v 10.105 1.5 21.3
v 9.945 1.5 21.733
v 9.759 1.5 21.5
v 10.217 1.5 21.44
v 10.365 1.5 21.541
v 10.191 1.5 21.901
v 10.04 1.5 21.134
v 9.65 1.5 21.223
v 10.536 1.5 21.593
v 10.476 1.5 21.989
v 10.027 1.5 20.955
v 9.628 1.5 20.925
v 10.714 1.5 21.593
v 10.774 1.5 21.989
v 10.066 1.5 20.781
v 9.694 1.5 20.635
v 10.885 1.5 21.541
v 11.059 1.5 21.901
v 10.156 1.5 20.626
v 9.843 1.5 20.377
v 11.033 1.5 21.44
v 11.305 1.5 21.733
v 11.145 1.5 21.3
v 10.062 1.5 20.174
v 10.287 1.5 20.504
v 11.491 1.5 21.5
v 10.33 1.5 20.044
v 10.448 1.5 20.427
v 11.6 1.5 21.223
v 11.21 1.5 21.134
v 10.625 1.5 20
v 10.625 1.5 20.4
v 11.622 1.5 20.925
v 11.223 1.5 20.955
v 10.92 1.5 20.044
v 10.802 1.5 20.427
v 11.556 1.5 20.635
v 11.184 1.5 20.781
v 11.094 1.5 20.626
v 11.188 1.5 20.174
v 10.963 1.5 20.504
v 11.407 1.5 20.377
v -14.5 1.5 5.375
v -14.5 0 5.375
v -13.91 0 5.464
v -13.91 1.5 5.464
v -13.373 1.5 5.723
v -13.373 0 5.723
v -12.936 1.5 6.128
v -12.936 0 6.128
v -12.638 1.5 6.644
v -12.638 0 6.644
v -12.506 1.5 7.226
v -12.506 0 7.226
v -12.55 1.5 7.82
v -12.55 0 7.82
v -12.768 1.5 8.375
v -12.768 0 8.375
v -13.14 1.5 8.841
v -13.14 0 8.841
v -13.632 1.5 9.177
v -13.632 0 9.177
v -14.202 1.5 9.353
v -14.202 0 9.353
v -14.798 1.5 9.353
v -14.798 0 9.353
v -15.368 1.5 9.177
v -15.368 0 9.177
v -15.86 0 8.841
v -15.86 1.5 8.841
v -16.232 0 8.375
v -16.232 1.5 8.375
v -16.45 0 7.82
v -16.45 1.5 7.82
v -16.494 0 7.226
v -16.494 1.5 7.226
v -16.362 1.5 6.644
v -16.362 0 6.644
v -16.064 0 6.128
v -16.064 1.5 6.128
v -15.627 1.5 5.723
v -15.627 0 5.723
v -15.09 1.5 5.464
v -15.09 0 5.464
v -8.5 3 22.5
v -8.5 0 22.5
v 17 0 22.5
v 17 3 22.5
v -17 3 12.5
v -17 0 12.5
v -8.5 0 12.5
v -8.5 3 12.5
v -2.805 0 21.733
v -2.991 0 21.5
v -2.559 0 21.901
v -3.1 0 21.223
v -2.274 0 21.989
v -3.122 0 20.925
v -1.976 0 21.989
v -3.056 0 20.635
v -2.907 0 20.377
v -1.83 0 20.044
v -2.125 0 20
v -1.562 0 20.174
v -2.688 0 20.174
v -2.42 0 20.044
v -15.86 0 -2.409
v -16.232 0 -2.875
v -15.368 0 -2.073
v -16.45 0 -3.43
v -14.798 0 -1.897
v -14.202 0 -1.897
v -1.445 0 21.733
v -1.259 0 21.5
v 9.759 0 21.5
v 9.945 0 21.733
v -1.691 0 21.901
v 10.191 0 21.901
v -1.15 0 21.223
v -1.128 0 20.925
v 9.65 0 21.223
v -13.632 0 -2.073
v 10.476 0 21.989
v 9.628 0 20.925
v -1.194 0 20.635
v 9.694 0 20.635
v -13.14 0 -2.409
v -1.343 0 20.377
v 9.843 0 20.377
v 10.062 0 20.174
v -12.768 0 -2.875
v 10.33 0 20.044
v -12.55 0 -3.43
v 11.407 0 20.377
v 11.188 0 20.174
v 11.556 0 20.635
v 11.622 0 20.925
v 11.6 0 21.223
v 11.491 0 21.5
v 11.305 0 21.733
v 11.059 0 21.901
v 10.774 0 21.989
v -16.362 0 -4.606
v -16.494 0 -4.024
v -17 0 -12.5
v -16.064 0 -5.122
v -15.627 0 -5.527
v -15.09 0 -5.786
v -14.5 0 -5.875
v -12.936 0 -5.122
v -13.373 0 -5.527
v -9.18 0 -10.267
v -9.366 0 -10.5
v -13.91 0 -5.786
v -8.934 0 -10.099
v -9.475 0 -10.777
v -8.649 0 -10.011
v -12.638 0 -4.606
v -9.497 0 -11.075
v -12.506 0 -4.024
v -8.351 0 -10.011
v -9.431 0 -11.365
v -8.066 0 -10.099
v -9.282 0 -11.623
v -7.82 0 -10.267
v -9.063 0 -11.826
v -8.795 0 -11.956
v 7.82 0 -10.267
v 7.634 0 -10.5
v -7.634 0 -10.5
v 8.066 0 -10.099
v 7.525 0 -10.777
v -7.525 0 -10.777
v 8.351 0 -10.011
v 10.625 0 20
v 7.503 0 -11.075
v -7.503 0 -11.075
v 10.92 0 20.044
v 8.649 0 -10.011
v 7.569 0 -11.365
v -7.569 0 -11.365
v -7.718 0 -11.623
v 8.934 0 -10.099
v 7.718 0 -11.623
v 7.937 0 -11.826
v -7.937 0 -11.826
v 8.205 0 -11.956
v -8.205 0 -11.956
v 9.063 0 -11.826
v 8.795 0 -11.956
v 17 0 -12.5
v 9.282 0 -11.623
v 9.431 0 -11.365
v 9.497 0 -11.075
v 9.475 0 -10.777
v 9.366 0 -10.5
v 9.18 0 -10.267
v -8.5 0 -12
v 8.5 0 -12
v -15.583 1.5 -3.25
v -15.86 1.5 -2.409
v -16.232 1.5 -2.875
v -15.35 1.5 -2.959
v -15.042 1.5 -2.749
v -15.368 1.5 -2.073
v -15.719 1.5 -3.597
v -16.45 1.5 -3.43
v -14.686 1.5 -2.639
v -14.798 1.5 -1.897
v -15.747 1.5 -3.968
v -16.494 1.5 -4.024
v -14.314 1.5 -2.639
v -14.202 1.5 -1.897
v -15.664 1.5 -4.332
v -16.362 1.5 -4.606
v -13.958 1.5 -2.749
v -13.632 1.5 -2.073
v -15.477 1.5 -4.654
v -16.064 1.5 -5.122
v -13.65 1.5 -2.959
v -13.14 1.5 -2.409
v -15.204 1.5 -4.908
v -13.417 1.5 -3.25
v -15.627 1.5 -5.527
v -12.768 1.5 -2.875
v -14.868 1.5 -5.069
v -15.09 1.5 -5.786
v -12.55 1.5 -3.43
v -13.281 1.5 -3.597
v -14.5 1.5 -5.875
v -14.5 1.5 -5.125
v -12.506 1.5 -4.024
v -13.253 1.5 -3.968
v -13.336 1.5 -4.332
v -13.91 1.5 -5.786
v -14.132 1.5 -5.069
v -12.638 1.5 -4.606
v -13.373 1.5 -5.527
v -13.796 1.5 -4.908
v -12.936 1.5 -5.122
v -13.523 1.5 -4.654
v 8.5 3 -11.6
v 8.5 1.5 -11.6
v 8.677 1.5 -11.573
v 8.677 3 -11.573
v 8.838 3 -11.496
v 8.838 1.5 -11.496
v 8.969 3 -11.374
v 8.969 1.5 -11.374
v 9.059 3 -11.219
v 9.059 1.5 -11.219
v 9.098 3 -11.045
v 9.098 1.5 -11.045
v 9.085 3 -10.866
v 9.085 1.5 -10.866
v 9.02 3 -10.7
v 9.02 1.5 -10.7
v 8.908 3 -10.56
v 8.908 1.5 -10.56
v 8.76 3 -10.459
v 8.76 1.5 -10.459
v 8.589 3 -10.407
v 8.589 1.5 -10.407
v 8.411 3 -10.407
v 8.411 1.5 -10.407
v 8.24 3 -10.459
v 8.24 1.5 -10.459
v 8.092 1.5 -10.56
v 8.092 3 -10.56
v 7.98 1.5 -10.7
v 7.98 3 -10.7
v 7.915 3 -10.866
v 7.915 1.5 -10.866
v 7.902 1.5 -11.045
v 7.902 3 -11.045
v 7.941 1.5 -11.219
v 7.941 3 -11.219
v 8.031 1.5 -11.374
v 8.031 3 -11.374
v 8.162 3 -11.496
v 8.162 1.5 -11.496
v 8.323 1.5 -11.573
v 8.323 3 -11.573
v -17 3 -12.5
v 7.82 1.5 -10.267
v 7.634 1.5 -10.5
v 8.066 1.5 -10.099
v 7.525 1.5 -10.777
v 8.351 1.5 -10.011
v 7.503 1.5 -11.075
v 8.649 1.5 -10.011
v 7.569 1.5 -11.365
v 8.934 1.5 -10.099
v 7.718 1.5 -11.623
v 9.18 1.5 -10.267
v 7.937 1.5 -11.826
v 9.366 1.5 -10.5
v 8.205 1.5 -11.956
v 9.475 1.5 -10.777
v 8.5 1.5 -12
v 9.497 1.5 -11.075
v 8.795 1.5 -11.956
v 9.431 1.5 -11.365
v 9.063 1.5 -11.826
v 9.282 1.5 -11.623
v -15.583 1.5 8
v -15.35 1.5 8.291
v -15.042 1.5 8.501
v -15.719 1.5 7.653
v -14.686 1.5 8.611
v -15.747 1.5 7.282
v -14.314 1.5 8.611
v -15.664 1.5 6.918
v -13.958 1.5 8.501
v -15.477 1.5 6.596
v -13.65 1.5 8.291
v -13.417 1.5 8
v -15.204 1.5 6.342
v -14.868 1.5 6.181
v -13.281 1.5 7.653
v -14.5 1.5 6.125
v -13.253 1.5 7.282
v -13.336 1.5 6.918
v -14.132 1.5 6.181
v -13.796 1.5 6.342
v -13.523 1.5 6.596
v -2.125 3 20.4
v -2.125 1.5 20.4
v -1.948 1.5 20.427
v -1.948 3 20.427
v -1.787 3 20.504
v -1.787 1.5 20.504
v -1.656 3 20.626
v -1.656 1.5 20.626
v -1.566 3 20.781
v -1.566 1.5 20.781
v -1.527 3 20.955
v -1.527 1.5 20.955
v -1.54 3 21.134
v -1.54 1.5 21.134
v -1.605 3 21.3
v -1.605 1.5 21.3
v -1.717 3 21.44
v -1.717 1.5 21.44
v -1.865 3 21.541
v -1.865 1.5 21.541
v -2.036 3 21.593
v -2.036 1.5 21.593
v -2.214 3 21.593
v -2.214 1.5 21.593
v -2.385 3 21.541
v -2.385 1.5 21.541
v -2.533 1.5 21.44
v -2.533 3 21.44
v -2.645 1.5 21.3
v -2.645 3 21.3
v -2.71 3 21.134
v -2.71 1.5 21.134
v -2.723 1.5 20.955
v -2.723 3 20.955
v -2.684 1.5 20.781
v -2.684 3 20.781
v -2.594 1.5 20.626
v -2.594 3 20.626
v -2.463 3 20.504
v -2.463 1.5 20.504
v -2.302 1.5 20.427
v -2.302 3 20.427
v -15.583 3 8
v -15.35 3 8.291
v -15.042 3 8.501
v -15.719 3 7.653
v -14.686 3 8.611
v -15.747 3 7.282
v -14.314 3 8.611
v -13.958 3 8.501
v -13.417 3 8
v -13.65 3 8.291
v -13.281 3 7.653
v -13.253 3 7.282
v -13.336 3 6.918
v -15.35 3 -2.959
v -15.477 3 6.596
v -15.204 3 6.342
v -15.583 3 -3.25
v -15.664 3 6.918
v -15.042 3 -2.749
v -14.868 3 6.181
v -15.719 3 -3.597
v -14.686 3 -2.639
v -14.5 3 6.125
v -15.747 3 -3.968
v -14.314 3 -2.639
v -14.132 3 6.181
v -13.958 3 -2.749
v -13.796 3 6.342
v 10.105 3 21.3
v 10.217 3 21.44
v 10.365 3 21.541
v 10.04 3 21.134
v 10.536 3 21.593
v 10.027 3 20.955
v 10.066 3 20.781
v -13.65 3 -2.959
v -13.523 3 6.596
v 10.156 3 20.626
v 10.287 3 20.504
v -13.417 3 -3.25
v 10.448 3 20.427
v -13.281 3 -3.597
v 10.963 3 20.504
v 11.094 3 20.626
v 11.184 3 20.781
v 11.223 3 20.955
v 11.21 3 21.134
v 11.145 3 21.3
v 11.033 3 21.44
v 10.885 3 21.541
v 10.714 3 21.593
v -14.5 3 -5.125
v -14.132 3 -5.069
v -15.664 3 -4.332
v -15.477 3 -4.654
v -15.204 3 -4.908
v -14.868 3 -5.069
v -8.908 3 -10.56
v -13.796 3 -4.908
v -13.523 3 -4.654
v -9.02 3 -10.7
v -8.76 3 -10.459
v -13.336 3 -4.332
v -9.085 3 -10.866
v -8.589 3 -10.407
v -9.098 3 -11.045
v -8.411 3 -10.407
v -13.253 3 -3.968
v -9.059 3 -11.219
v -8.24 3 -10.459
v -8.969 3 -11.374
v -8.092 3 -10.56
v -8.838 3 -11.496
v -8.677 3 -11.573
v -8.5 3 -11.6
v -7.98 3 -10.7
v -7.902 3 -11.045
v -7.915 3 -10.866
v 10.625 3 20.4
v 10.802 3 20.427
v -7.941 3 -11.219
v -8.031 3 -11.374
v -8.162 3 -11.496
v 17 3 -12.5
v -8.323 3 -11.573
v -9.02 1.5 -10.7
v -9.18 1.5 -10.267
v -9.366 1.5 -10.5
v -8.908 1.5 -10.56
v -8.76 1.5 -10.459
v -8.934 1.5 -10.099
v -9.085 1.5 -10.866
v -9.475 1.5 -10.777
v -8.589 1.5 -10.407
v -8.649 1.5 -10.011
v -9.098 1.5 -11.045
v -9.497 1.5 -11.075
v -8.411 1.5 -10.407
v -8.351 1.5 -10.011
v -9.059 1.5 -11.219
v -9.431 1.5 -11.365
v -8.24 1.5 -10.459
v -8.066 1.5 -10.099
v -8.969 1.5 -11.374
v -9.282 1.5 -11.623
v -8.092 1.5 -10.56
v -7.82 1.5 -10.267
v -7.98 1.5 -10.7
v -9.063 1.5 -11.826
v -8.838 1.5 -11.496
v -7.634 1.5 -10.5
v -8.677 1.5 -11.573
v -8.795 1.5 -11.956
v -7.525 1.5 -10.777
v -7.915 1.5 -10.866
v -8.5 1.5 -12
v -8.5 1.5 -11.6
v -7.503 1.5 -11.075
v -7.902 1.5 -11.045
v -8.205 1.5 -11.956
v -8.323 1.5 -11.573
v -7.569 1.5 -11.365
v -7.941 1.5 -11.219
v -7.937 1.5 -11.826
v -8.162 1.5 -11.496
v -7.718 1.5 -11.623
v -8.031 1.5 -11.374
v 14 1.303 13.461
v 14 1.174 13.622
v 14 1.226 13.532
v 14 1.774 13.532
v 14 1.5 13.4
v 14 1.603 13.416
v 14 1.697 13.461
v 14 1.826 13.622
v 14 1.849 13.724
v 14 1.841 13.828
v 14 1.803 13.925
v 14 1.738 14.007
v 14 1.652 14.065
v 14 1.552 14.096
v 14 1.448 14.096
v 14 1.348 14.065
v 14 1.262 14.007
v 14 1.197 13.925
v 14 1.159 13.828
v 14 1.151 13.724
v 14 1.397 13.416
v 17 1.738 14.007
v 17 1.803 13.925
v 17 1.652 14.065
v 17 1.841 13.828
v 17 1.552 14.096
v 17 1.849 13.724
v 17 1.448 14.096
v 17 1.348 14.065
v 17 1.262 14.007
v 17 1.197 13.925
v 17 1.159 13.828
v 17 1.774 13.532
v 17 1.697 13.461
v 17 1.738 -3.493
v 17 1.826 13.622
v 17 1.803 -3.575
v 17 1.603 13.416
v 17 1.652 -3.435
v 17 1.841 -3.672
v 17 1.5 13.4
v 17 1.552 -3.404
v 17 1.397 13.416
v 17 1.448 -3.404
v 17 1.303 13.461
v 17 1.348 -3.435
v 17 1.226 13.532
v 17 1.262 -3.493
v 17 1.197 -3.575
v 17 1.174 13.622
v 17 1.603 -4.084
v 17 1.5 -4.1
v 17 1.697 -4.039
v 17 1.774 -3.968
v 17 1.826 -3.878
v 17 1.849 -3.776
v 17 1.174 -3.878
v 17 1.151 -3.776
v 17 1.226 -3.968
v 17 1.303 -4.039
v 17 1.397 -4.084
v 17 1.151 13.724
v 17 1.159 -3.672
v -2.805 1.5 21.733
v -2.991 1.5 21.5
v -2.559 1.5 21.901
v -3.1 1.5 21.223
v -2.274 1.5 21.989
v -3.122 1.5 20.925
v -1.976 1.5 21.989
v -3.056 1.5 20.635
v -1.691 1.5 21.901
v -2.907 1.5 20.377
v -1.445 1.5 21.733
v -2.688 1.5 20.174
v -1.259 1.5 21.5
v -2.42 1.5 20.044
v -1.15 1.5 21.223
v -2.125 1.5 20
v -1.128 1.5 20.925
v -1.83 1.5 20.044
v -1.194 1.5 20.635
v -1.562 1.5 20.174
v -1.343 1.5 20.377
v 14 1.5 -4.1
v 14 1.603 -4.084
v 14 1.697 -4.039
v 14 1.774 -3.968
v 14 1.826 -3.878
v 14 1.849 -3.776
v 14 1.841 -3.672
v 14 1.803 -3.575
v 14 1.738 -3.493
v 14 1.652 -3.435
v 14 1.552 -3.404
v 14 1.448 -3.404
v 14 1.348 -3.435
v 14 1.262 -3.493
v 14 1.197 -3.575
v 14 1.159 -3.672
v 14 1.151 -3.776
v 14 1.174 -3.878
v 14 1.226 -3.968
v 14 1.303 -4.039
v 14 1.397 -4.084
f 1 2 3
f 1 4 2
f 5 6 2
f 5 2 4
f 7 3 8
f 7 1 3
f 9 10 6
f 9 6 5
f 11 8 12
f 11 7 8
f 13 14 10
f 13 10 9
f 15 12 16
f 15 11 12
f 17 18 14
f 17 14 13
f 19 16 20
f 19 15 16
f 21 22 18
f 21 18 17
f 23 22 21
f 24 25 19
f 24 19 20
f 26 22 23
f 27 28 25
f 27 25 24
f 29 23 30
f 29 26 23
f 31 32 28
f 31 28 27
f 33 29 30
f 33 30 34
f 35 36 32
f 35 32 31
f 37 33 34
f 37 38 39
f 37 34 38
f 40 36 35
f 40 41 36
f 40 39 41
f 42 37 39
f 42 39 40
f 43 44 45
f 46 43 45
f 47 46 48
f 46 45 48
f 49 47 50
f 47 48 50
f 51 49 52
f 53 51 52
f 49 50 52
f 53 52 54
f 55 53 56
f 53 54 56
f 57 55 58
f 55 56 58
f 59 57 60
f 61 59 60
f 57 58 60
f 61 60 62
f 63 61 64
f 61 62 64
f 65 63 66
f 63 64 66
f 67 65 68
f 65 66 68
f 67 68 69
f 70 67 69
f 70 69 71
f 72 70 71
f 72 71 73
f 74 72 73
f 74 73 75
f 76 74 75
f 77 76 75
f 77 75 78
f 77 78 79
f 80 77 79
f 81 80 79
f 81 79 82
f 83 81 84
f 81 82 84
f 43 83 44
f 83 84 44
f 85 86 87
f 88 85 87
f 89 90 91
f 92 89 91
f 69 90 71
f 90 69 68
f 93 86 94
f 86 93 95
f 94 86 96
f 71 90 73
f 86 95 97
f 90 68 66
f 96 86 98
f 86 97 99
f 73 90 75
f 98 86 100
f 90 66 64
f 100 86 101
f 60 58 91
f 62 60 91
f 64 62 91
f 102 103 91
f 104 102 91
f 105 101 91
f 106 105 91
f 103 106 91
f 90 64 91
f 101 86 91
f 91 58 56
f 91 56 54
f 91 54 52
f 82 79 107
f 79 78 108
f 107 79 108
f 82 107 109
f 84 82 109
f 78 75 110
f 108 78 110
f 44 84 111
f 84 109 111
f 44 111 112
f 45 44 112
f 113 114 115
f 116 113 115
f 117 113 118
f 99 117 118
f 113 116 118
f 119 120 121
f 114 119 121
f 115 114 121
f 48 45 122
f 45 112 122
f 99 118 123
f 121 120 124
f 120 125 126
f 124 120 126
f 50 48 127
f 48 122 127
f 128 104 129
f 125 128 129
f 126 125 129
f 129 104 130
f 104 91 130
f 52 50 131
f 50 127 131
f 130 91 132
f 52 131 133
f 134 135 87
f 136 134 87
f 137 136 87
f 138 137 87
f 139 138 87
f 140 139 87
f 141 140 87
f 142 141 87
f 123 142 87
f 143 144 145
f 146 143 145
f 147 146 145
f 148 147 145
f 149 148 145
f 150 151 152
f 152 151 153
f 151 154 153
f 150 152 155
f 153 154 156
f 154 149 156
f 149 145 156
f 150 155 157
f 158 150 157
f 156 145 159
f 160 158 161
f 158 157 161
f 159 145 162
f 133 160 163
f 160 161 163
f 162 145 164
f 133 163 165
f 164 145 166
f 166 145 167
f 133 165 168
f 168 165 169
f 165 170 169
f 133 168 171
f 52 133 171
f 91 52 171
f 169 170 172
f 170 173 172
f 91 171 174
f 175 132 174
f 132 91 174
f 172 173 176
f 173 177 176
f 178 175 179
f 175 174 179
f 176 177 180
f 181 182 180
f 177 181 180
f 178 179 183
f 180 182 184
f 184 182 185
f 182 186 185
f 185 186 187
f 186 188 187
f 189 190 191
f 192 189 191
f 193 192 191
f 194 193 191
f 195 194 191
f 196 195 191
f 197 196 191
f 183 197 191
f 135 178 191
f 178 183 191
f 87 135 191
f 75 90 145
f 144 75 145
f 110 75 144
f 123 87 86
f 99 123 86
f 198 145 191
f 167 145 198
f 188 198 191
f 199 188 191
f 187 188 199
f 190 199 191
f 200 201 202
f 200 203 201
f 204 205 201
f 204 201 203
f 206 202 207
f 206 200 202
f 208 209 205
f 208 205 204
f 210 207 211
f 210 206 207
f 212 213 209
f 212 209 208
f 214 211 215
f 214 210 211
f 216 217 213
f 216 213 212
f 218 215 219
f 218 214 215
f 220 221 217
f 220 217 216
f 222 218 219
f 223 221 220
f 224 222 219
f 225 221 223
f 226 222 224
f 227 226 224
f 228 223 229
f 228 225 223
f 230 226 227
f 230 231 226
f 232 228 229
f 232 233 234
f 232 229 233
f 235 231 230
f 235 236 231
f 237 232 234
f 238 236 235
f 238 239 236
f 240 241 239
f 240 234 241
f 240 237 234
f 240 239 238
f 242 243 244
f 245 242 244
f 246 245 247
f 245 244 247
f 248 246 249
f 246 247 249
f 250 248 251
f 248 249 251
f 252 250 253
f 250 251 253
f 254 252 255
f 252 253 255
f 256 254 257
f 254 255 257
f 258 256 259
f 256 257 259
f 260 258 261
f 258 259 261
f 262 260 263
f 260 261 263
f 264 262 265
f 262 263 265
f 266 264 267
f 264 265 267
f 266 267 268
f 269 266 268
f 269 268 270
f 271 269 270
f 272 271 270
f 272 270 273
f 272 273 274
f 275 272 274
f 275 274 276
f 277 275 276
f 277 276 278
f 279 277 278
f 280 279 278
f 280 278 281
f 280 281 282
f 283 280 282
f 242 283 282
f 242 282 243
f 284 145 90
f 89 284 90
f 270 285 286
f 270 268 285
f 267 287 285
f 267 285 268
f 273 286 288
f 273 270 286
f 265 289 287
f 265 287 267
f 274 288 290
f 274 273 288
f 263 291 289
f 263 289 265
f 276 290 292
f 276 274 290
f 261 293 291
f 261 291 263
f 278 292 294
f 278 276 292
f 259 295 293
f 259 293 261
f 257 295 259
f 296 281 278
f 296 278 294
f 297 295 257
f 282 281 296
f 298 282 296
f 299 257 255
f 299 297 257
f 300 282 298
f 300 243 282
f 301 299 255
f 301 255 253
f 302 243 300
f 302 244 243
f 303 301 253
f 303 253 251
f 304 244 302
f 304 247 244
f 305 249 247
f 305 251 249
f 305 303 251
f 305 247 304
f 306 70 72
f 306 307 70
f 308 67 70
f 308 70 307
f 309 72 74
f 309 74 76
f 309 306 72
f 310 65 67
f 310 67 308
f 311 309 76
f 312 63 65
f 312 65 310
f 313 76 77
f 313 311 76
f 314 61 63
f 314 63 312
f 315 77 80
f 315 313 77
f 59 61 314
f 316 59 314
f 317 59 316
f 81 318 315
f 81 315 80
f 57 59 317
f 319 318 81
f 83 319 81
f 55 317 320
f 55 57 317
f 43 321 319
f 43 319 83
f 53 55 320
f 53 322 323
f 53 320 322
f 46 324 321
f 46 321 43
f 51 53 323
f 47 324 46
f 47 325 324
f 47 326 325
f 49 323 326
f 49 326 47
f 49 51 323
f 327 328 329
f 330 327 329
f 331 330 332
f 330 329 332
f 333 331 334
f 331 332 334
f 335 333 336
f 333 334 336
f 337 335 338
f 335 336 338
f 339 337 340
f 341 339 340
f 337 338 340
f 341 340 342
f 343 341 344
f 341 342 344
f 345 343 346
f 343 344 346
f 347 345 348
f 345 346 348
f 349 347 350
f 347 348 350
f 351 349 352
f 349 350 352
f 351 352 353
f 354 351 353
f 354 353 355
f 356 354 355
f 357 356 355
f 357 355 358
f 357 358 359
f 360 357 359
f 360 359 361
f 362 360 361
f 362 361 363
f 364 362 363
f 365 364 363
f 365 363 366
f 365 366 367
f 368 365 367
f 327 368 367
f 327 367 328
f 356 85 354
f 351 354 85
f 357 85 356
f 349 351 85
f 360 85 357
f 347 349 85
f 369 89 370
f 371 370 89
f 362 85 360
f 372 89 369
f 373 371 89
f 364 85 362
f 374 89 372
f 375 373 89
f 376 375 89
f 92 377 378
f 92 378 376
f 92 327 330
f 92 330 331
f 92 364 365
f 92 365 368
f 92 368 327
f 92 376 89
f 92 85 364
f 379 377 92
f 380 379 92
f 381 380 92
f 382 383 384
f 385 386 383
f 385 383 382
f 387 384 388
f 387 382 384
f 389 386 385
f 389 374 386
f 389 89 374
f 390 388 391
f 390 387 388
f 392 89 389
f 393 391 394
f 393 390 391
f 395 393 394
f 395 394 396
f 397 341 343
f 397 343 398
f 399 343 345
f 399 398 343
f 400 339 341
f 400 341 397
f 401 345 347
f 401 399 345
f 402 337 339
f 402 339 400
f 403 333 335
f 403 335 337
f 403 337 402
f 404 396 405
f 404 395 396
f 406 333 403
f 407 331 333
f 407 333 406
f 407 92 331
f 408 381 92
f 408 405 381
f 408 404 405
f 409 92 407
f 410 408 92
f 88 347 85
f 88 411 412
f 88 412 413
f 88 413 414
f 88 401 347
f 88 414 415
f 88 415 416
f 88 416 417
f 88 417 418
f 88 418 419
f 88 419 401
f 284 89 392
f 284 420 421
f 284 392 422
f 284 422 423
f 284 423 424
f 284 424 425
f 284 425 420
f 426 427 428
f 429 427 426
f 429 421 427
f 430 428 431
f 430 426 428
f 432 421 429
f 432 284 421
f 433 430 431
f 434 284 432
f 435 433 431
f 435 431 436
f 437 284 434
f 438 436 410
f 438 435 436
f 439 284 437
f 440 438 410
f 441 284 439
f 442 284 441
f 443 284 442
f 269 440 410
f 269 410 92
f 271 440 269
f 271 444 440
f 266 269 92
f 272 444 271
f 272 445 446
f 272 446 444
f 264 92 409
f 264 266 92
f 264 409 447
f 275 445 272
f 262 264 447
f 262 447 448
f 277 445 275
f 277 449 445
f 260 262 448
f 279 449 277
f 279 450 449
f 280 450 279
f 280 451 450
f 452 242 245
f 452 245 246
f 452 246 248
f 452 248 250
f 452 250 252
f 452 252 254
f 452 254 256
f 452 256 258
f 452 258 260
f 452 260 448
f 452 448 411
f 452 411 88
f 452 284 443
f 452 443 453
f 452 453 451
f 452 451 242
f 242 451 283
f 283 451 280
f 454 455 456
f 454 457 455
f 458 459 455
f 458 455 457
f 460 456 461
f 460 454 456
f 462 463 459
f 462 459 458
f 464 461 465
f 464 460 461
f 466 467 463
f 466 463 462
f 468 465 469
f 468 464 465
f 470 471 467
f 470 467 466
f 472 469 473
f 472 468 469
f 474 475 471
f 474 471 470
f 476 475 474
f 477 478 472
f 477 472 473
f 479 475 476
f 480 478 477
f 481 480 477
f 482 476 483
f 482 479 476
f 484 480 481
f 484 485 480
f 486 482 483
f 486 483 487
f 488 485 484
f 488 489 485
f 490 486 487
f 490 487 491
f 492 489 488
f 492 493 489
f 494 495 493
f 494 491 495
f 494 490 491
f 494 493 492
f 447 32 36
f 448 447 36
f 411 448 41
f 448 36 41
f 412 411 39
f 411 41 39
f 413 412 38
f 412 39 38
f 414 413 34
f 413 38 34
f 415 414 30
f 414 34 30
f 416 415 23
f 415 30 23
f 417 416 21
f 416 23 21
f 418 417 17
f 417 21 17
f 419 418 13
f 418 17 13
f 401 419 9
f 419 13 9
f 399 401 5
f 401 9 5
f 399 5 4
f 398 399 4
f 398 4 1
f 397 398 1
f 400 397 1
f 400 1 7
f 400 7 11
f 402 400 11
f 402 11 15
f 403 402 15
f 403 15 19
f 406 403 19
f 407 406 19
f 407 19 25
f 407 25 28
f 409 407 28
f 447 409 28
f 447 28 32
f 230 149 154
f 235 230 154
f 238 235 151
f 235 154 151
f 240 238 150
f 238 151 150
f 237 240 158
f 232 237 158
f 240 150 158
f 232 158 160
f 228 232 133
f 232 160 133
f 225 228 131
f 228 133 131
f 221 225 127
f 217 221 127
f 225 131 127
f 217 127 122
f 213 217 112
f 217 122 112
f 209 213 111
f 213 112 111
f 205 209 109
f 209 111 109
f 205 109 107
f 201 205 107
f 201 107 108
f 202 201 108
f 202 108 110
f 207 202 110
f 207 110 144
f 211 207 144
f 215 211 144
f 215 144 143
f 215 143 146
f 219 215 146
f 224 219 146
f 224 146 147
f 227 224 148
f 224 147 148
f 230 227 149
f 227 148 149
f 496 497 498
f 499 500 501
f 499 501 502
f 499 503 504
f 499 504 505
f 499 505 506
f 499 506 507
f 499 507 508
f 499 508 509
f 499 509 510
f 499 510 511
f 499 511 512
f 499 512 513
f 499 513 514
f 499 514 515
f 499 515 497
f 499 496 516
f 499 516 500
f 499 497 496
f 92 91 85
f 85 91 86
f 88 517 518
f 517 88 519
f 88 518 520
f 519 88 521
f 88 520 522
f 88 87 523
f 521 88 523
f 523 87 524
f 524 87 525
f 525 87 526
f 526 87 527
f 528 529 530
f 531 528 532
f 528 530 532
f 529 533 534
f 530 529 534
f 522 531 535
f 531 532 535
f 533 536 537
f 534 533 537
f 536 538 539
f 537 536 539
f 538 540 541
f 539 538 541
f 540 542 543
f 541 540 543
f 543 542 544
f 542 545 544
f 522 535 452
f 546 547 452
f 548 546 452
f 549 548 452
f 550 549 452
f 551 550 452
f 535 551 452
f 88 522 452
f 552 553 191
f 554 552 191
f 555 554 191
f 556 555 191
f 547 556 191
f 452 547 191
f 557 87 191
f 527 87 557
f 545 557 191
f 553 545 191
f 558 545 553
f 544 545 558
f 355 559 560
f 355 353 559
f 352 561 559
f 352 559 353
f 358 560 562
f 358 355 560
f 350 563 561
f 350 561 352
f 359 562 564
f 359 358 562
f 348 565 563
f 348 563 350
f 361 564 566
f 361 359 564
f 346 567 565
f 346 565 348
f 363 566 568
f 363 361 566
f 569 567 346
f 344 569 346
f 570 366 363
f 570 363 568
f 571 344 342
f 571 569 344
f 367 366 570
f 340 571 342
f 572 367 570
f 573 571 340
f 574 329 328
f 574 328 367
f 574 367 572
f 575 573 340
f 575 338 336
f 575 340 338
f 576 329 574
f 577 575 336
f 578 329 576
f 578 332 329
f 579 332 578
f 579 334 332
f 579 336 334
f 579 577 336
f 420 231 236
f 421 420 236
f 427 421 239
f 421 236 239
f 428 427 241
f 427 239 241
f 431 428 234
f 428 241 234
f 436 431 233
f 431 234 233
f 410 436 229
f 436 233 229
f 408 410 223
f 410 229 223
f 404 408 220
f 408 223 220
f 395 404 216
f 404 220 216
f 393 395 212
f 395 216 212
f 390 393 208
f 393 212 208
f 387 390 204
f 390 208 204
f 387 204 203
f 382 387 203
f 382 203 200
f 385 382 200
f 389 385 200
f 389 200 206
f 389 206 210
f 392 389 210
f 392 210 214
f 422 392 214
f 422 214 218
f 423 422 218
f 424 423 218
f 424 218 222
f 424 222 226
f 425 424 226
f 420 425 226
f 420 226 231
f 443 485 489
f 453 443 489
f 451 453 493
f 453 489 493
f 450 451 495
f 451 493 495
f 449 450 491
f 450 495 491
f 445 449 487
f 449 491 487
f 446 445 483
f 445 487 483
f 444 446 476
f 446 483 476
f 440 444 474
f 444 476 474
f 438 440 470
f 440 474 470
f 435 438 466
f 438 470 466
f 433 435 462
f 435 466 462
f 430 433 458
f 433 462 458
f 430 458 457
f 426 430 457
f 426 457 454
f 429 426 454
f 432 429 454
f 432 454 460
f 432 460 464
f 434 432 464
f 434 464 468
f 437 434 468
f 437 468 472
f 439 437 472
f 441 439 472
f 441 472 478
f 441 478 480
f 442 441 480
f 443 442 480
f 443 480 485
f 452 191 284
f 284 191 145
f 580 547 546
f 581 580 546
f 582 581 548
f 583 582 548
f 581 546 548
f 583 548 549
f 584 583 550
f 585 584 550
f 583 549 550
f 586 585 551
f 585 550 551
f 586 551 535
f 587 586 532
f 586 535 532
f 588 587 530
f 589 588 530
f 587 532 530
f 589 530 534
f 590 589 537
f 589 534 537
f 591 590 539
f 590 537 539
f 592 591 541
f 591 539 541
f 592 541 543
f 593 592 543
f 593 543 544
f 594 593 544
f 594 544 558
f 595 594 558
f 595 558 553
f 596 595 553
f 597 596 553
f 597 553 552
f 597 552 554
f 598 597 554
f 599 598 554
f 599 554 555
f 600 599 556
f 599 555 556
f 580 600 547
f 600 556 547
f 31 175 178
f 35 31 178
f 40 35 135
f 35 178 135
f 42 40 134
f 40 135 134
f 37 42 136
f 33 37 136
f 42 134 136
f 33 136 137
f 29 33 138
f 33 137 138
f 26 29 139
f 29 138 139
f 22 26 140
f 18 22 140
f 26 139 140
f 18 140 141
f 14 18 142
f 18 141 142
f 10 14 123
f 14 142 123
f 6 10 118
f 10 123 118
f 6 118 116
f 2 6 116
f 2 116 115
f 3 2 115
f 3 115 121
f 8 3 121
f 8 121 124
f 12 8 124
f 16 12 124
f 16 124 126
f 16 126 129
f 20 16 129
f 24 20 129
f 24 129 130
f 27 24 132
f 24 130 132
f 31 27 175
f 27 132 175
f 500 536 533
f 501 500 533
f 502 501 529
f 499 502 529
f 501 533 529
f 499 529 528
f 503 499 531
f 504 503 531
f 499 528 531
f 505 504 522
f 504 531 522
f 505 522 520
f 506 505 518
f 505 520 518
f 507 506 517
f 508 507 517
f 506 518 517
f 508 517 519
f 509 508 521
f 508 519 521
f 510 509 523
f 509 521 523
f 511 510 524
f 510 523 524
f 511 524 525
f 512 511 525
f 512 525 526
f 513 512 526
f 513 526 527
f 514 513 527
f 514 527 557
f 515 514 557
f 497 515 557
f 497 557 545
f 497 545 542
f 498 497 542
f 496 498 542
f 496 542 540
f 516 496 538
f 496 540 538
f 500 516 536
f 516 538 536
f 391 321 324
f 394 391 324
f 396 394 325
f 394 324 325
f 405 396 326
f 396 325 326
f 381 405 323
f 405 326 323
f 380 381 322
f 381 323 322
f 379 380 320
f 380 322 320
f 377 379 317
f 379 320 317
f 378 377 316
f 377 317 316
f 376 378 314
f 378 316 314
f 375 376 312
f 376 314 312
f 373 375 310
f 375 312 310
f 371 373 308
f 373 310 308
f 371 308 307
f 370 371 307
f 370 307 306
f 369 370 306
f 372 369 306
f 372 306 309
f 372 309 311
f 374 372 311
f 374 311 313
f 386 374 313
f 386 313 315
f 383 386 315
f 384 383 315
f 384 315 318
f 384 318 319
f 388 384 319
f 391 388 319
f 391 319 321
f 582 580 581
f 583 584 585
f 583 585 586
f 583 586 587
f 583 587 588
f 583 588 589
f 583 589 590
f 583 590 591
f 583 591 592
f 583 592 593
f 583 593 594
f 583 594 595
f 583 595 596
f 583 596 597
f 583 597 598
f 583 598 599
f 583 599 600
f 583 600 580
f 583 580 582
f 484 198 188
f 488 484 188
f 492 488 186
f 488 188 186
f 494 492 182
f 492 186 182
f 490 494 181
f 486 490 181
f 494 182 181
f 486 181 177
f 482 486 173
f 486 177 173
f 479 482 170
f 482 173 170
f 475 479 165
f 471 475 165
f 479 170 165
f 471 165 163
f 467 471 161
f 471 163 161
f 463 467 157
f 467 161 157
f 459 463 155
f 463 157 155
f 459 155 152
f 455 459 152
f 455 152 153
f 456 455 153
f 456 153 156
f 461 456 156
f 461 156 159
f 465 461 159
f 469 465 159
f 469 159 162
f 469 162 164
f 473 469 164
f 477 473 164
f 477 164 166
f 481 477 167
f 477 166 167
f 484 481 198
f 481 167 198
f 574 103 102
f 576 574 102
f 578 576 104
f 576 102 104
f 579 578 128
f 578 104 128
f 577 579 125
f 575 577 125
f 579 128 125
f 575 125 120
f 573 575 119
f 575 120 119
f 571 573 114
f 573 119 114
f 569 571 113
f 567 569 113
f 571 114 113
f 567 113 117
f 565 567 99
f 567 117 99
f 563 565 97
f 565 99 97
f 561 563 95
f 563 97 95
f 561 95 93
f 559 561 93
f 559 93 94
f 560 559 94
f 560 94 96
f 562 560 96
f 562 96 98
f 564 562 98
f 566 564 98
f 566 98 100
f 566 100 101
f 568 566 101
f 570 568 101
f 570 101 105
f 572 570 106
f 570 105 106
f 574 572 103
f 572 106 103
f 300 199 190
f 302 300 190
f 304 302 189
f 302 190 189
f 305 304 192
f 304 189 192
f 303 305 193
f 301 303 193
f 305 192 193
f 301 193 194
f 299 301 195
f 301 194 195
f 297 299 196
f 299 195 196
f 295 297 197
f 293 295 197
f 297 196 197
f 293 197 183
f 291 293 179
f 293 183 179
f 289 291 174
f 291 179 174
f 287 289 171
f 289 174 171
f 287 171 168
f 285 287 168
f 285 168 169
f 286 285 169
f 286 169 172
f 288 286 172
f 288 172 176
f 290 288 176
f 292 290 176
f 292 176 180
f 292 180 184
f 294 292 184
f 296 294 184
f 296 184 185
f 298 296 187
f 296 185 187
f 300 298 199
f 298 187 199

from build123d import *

# Parameters (mm, degrees)
SKETCH_1_W          = 25.5
SKETCH_1_H          = 10
EXTRUDE_1_DEPTH     = 3
SKETCH_2_R          = 1.25
SKETCH_2_R_2        = 0.6
CUT_EXTRUDE_1_DEPTH = 29.359301825
SKETCH_2_3_R        = 2
SKETCH_2_3_R_2      = 1
CUT_EXTRUDE_2_DEPTH = 1.5
SKETCH_3_R          = 0.35
CUT_EXTRUDE_3_DEPTH = 3


with BuildPart() as part:
    # 草图1 → 凸台-拉伸1 (new body)
    with BuildSketch(Plane(origin=(0, 0, 0), x_dir=(1, 0, 0), z_dir=(0, 1, 0))):
        Polygon((-17, 12.5), (-17, -12.5), (-8.5, -12.5), (17, -12.5), (17, 12.5), align=None)
        with Locations((4.25, -17.5)):
            Rectangle(SKETCH_1_W, SKETCH_1_H)
    extrude(amount=EXTRUDE_1_DEPTH)

    # 草图2 → 切除-拉伸1 (cut, through all)
    with BuildSketch(Plane(origin=(0, 0, 0), x_dir=(-1, 0, 0), z_dir=(0, -1, 0))):
        with Locations((14.499999998, -7.374985298)):
            Circle(SKETCH_2_R)
        with Locations((14.499999998, 3.875014702)):
            Circle(SKETCH_2_R)
        with Locations((-10.625, -21)):
            Circle(SKETCH_2_R_2)
        with Locations((2.125, -21)):
            Circle(SKETCH_2_R_2)
        with Locations((-8.5, 11)):
            Circle(SKETCH_2_R_2)
        with Locations((8.5, 11)):
            Circle(SKETCH_2_R_2)
    extrude(amount=-CUT_EXTRUDE_1_DEPTH, mode=Mode.SUBTRACT)

    # 草图2<3> → 切除-拉伸2 (cut)
    with BuildSketch(Plane(origin=(0, 0, 0), x_dir=(-1, 0, 0), z_dir=(0, -1, 0))):
        with Locations((14.499999998, 3.875014702)):
            Circle(SKETCH_2_3_R)
        with Locations((14.499999998, -7.374985298)):
            Circle(SKETCH_2_3_R)
        with Locations((-10.625, -21)):
            Circle(SKETCH_2_3_R_2)
        with Locations((2.125, -21)):
            Circle(SKETCH_2_3_R_2)
        with Locations((-8.5, 11)):
            Circle(SKETCH_2_3_R_2)
        with Locations((8.5, 11)):
            Circle(SKETCH_2_3_R_2)
    extrude(amount=-CUT_EXTRUDE_2_DEPTH, mode=Mode.SUBTRACT)

    # 草图3 → 切除-拉伸3 (cut)
    with BuildSketch(Plane(origin=(17, 0, 0), x_dir=(0, 0, -1), z_dir=(1, 0, 0))):
        with Locations((3.75, 1.5)):
            Circle(SKETCH_3_R)
        with Locations((-13.75, 1.5)):
            Circle(SKETCH_3_R)
    extrude(amount=-CUT_EXTRUDE_3_DEPTH, mode=Mode.SUBTRACT)


solid = part.part
